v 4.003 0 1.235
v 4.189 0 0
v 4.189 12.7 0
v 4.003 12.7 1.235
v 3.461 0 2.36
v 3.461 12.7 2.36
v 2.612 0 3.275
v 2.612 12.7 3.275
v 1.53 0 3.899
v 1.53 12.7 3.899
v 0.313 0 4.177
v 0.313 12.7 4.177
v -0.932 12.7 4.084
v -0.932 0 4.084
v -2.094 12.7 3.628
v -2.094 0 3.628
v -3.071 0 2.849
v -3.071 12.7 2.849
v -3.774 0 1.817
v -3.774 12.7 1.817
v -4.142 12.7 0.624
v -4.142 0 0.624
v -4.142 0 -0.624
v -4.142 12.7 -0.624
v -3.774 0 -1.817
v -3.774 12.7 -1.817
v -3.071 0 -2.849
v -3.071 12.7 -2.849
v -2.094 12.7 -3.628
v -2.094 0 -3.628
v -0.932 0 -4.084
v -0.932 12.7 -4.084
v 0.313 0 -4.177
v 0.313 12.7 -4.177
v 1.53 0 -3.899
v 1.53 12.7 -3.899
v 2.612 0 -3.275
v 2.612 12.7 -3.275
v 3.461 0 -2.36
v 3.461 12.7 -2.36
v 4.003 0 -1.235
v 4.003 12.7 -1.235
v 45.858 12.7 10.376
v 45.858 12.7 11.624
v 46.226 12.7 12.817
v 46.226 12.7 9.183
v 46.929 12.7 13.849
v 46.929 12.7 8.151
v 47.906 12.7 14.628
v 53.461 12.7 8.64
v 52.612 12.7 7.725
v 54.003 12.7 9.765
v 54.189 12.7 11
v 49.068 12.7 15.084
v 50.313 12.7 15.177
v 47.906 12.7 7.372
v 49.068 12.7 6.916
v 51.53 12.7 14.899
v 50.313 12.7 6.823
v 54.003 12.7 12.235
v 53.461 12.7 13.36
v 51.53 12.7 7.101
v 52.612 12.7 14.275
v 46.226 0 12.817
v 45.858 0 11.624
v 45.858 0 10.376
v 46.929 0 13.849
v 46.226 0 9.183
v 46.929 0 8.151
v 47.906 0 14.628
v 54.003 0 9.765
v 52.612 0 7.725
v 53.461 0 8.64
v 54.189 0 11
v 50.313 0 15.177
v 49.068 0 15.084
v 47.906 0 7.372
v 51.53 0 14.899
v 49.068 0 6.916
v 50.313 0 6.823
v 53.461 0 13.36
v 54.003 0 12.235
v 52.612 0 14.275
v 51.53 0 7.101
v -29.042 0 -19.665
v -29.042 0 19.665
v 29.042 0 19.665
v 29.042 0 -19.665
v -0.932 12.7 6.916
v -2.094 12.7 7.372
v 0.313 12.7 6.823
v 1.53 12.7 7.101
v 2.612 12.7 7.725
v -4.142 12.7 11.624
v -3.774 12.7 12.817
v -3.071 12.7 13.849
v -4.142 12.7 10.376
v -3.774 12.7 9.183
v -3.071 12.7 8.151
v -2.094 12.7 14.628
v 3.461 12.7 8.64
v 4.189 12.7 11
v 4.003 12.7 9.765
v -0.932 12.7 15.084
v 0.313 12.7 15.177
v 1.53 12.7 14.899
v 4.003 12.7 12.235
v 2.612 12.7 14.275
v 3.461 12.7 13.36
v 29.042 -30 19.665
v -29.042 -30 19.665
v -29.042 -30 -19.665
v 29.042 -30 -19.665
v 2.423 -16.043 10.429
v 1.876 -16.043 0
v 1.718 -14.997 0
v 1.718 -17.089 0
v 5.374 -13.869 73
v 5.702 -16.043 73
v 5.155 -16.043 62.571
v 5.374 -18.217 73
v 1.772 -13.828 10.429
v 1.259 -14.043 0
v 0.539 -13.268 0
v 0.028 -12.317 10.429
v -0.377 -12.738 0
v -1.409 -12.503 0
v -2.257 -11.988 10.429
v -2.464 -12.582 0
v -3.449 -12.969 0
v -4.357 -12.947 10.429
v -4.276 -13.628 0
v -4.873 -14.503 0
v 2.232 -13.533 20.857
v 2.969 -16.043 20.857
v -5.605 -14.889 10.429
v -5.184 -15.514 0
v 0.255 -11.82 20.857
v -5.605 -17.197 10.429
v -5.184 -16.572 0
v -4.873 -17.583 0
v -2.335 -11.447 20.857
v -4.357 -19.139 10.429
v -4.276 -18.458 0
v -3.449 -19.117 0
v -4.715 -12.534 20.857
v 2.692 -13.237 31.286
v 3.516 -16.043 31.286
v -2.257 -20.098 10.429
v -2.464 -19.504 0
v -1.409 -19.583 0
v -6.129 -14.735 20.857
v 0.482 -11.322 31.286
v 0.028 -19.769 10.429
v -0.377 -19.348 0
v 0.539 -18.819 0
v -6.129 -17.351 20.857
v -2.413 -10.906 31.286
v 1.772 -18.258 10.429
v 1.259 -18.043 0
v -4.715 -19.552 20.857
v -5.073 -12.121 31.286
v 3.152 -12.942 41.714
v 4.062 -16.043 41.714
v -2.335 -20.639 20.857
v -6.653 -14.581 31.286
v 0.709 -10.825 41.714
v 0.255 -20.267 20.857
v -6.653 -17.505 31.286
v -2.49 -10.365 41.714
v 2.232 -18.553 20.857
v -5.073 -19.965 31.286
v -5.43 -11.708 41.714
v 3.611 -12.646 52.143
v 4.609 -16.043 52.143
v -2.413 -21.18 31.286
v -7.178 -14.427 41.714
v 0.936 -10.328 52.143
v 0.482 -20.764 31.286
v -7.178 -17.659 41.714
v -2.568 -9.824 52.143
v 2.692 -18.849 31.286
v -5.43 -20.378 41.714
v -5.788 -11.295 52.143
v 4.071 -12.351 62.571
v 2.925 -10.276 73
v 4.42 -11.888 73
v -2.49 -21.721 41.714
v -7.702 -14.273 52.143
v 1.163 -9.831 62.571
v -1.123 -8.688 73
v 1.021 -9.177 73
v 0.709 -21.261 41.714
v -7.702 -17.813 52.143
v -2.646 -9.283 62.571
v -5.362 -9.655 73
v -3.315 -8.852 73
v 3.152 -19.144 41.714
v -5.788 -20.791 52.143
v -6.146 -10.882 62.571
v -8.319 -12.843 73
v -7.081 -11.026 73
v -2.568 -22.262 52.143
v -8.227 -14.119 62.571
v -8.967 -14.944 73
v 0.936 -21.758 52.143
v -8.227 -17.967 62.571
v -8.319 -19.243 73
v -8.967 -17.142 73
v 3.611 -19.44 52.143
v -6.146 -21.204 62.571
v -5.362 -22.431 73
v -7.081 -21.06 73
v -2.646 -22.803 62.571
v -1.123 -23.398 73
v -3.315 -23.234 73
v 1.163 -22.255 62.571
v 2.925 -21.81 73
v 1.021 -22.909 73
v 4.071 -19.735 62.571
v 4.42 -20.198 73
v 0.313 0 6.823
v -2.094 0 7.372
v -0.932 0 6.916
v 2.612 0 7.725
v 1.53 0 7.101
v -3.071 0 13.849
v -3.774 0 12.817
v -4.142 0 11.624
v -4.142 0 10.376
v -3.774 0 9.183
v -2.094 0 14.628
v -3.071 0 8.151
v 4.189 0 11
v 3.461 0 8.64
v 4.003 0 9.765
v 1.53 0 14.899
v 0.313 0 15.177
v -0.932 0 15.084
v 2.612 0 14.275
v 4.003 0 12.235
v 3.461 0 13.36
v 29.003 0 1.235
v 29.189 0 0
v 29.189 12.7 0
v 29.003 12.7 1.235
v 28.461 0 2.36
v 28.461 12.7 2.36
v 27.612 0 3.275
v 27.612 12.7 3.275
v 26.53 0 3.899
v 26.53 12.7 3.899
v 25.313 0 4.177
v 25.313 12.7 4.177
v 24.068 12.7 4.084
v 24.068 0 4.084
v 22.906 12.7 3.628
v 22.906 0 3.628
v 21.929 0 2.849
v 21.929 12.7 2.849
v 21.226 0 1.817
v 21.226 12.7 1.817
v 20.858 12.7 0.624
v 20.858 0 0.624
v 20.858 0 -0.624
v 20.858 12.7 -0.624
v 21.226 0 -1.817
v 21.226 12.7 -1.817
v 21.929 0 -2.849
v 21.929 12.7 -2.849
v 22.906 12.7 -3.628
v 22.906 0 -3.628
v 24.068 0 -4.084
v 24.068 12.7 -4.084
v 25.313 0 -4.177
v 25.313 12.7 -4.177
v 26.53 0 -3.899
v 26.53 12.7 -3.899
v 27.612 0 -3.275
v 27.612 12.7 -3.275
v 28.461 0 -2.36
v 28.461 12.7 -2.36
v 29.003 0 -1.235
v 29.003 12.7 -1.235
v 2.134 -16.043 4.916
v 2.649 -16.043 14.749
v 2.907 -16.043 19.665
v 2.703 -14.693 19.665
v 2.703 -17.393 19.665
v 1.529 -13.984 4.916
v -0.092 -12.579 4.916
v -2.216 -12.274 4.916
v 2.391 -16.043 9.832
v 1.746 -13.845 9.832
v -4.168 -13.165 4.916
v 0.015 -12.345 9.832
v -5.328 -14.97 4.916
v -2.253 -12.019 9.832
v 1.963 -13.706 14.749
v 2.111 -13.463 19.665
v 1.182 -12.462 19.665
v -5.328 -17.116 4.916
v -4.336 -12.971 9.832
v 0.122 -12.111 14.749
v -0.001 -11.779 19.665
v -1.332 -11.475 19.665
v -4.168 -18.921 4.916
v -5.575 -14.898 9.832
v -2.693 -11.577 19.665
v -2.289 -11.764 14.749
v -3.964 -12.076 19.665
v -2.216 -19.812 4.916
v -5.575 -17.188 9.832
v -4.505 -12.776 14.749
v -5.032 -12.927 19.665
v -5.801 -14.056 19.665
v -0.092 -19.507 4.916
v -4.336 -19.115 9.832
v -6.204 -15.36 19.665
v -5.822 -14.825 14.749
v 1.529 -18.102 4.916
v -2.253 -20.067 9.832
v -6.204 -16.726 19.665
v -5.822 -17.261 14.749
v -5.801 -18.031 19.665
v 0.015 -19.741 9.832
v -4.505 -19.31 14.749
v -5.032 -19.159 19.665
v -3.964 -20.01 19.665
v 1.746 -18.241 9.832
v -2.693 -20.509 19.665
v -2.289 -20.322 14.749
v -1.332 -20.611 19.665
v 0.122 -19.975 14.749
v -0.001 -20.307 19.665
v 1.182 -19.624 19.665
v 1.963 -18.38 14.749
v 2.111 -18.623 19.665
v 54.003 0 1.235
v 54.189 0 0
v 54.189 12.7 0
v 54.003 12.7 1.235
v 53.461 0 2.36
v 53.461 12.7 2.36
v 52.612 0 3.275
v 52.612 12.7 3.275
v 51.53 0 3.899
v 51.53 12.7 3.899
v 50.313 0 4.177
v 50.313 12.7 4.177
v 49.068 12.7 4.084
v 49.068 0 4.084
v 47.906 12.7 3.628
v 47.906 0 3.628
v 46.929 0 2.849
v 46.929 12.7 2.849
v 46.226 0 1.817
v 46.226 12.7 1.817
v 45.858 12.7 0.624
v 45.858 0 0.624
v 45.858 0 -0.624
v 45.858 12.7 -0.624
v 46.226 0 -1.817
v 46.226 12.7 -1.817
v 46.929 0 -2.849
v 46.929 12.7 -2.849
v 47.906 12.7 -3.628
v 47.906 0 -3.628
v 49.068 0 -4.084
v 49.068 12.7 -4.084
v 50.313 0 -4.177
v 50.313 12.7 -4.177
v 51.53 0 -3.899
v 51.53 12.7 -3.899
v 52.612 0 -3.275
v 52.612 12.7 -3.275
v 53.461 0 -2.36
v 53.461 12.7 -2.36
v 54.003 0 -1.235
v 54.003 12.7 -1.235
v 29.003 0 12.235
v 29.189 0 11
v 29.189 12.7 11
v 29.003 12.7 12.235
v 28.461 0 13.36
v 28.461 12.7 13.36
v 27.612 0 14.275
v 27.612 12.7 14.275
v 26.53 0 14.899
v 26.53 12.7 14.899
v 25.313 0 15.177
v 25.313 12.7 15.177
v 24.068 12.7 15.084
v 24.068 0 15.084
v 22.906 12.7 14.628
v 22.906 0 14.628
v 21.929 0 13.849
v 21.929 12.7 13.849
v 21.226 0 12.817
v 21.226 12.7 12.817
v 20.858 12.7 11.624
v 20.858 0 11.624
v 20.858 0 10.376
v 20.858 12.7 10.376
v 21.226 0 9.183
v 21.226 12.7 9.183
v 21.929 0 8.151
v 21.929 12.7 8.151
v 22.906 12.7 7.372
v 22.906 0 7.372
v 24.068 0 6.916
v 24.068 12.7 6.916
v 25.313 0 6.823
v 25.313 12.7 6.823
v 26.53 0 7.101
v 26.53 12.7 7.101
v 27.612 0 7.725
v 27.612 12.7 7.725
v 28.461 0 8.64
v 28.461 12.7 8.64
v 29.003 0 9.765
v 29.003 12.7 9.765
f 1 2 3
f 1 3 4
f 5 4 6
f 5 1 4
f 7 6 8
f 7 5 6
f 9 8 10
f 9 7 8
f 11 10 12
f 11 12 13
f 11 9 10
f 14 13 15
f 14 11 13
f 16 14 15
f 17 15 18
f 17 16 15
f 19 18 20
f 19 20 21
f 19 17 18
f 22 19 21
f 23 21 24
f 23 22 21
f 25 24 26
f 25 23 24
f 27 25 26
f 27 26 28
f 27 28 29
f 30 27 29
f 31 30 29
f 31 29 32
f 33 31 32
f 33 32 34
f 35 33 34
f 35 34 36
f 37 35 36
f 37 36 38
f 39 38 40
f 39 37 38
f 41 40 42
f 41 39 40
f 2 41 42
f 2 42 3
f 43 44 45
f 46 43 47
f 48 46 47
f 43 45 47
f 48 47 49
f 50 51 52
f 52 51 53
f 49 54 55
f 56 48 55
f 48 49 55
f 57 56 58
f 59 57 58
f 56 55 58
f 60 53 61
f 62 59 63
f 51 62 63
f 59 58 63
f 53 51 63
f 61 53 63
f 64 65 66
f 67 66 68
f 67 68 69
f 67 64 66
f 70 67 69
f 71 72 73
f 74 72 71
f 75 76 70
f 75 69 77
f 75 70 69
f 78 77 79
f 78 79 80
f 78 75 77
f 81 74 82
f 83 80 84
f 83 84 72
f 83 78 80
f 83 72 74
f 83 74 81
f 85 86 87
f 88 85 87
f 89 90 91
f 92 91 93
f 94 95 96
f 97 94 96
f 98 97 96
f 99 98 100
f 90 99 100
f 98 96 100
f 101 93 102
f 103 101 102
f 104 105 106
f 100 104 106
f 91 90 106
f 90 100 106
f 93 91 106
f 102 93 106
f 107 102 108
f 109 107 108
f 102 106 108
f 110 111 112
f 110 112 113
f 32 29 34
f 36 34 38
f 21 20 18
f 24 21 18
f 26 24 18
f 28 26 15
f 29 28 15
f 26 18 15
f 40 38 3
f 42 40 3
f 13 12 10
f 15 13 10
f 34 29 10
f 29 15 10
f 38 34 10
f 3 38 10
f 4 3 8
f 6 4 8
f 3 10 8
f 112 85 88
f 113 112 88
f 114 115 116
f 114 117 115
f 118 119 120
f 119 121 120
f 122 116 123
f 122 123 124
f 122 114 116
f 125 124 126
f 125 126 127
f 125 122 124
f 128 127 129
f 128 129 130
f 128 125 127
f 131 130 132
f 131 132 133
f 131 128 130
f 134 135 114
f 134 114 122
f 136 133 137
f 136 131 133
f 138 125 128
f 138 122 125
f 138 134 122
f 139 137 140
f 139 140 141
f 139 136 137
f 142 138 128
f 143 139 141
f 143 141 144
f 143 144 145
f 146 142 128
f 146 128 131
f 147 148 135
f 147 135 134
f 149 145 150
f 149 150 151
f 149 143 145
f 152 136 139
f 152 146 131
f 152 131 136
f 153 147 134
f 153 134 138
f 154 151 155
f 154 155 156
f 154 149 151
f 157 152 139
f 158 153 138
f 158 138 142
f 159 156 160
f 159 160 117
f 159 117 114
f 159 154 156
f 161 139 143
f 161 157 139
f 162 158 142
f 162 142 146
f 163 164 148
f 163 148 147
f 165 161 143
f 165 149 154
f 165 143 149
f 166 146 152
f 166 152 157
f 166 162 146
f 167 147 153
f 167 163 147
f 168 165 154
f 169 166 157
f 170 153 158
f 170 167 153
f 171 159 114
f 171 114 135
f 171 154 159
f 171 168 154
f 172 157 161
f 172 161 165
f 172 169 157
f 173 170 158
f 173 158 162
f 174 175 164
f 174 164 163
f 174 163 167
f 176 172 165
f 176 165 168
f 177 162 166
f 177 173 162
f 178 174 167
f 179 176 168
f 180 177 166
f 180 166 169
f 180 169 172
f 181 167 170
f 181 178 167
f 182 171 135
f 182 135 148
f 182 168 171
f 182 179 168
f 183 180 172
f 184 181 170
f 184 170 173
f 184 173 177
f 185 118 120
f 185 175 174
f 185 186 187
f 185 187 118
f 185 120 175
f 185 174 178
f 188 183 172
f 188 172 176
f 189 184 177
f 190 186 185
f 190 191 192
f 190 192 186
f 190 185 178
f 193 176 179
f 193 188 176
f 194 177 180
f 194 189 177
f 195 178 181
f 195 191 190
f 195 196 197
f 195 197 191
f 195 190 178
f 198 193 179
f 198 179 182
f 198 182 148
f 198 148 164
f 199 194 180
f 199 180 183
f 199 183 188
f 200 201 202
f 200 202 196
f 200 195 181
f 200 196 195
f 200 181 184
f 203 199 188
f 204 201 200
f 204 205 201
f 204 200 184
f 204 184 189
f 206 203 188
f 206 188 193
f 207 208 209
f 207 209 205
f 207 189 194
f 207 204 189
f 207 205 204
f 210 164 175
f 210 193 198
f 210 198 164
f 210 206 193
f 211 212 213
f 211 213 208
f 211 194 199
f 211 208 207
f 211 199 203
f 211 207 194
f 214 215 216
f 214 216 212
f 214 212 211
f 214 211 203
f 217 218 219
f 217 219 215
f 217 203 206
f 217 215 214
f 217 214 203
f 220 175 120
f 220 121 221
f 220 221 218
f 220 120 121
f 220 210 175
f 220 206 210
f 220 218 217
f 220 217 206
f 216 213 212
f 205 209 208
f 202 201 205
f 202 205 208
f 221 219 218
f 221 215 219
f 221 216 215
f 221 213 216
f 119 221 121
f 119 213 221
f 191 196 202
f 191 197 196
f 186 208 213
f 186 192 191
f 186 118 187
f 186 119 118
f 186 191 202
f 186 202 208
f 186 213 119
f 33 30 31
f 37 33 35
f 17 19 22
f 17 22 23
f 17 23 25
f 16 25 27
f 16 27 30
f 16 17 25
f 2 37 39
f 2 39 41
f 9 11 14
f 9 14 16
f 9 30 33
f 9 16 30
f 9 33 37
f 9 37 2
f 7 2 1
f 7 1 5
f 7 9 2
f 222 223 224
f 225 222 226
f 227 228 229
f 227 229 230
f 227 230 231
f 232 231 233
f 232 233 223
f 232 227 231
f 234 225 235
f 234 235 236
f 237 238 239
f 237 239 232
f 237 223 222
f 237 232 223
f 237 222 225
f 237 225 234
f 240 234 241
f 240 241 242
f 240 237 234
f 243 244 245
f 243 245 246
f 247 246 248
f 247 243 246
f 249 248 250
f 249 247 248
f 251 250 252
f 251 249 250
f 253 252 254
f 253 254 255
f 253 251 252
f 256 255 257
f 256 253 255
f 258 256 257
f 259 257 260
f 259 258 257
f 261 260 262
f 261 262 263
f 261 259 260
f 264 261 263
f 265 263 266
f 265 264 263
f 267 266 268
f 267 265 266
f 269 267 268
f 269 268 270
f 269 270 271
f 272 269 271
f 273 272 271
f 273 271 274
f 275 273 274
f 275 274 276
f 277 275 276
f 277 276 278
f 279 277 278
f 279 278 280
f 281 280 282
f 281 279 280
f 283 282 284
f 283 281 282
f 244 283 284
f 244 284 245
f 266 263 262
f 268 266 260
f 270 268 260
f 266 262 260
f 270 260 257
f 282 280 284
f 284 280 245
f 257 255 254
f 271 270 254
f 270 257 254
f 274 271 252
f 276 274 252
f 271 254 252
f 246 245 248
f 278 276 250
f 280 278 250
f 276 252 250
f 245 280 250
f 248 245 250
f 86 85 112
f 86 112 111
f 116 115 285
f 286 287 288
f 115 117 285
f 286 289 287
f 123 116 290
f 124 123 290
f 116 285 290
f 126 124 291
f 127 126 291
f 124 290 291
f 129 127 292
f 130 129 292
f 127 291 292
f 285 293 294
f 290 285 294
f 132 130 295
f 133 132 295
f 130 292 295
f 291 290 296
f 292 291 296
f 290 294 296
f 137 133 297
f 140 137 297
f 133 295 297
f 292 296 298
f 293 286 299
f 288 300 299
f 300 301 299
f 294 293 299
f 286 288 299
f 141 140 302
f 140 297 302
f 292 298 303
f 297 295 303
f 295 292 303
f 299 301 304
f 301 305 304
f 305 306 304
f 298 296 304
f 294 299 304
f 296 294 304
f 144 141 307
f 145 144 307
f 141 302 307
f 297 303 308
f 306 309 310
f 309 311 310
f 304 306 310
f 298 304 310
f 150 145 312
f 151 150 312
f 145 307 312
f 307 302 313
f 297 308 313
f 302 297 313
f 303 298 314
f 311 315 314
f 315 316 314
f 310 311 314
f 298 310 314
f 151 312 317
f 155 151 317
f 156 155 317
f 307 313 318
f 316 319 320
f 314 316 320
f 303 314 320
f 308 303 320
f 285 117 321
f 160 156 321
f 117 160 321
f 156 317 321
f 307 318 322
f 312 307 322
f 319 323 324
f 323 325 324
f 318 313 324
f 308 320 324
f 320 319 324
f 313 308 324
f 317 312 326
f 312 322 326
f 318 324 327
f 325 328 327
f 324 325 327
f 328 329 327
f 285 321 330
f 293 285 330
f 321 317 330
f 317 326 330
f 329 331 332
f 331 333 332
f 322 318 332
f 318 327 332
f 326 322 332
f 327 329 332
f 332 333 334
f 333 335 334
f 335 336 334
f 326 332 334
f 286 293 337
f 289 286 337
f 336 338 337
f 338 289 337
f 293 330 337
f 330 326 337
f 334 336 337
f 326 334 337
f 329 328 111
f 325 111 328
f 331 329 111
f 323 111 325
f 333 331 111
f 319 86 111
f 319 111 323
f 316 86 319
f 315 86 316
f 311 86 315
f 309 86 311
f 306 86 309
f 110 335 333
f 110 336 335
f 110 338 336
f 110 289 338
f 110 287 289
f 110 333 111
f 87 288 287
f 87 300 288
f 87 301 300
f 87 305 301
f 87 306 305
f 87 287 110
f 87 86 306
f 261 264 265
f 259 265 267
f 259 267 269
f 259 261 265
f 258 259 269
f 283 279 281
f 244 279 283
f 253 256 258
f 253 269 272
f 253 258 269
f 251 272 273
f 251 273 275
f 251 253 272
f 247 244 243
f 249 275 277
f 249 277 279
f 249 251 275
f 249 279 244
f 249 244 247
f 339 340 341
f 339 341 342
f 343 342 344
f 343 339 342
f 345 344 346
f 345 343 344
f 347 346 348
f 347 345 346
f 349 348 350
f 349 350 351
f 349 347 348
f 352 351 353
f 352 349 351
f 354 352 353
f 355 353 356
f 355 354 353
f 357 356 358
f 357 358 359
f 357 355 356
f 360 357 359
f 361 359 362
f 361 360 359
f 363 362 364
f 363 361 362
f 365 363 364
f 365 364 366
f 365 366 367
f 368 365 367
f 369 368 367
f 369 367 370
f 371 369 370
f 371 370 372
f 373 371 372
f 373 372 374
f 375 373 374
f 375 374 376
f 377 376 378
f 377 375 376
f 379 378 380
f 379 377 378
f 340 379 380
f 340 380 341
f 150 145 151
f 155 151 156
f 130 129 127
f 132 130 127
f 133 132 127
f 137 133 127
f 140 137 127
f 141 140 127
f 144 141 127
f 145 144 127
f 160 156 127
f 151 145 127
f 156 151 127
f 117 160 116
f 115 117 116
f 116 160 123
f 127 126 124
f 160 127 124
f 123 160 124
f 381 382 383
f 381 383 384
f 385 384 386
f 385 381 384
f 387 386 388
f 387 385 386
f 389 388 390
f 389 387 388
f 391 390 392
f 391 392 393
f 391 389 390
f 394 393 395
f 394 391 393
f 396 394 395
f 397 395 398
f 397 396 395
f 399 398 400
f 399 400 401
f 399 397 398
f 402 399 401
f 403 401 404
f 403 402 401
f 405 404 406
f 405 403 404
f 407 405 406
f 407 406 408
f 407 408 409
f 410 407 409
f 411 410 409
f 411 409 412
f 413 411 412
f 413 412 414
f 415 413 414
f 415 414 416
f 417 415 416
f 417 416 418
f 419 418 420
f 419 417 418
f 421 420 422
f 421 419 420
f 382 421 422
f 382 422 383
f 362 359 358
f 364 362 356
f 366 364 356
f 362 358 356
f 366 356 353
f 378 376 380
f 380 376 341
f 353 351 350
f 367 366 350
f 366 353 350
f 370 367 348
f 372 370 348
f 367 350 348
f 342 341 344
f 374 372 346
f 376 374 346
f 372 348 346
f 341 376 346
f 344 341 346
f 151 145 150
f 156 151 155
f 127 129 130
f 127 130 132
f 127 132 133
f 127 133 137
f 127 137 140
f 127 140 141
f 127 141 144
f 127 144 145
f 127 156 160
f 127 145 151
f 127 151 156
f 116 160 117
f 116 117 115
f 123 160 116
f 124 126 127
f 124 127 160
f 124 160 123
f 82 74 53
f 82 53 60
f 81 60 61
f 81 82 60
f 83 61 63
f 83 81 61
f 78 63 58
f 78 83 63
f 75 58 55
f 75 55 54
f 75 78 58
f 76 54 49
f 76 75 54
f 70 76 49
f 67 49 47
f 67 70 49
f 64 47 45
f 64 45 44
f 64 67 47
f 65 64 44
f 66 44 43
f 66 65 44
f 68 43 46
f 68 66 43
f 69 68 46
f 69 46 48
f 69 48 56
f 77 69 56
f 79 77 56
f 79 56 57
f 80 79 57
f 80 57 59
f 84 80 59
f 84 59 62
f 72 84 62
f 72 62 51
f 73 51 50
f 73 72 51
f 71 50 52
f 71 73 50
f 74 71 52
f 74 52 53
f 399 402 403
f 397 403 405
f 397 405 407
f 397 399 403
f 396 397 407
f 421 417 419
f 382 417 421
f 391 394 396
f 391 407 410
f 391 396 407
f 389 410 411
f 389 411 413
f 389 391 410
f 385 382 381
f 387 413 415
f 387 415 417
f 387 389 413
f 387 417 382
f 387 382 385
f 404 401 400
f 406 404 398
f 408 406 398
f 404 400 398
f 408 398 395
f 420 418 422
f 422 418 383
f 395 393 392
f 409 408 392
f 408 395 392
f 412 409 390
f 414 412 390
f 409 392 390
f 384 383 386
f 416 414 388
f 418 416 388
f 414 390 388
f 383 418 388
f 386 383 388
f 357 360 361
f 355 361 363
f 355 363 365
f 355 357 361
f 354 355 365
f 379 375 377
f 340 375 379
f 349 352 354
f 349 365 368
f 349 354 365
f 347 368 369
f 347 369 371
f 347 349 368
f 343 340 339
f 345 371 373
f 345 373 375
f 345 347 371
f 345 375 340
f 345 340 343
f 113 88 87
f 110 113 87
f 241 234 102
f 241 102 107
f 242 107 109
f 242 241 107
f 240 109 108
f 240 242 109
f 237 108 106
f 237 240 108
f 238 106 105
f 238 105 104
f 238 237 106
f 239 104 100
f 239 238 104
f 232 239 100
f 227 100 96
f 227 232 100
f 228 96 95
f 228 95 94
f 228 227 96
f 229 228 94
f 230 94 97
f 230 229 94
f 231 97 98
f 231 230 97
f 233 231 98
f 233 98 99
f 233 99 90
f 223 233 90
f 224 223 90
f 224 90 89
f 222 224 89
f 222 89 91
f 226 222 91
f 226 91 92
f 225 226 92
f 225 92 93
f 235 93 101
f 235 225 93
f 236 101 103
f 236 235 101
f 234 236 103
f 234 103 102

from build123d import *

# Parameters (mm, degrees)
F0_W     = 58.0838136375
F0_H     = 39.3294803798
F1_DEPTH = 30
F2_R     = 4.1888514279
F3_DEPTH = 12.7
F4_R     = 3.5500300139
F5_DEPTH = 73
F5_TAPER = -3


with BuildPart() as f1:
    # F0 (on Front) → F1 (new body)
    with BuildSketch(Plane.XZ):
        Rectangle(F0_W, F0_H)
    extrude(amount=F1_DEPTH)


with BuildPart() as f3:
    # F2 (on Front) → F3 (new body)
    with BuildSketch(Plane.XZ):
        Circle(F2_R)
    extrude(amount=-F3_DEPTH)


with BuildPart() as f3b:
    # F2 (on Front) → F3, piece 2 (new body)
    with BuildSketch(Plane.XZ):
        with Locations((0, 11)):
            Circle(F2_R)
    extrude(amount=-F3_DEPTH)


with BuildPart() as f3c:
    # F2 (on Front) → F3, piece 3 (new body)
    with BuildSketch(Plane.XZ):
        with Locations((25, 0)):
            Circle(F2_R)
    extrude(amount=-F3_DEPTH)


with BuildPart() as f3d:
    # F2 (on Front) → F3, piece 4 (new body)
    with BuildSketch(Plane.XZ):
        with Locations((25, 11)):
            Circle(F2_R)
    extrude(amount=-F3_DEPTH)


with BuildPart() as f3e:
    # F2 (on Front) → F3, piece 5 (new body)
    with BuildSketch(Plane.XZ):
        with Locations((50, 0)):
            Circle(F2_R)
    extrude(amount=-F3_DEPTH)


with BuildPart() as f3f:
    # F2 (on Front) → F3, piece 6 (new body)
    with BuildSketch(Plane.XZ):
        with Locations((50, 11)):
            Circle(F2_R)
    extrude(amount=-F3_DEPTH)


with BuildPart() as f5:
    # F4 (on Top) → F5 (new body)
    with BuildSketch(Plane.XY):
        with Locations((-1.6740621068, -16.0430576652)):
            Circle(F4_R)
    extrude(amount=F5_DEPTH, taper=F5_TAPER)


with BuildPart() as f1_1:
    add(f1.part)

    # F6: cut F5
    add(f5.part, mode=Mode.SUBTRACT)


solid = Compound([f3.part, f3b.part, f3c.part, f3d.part, f3e.part, f3f.part, f5.part, f1_1.part])
